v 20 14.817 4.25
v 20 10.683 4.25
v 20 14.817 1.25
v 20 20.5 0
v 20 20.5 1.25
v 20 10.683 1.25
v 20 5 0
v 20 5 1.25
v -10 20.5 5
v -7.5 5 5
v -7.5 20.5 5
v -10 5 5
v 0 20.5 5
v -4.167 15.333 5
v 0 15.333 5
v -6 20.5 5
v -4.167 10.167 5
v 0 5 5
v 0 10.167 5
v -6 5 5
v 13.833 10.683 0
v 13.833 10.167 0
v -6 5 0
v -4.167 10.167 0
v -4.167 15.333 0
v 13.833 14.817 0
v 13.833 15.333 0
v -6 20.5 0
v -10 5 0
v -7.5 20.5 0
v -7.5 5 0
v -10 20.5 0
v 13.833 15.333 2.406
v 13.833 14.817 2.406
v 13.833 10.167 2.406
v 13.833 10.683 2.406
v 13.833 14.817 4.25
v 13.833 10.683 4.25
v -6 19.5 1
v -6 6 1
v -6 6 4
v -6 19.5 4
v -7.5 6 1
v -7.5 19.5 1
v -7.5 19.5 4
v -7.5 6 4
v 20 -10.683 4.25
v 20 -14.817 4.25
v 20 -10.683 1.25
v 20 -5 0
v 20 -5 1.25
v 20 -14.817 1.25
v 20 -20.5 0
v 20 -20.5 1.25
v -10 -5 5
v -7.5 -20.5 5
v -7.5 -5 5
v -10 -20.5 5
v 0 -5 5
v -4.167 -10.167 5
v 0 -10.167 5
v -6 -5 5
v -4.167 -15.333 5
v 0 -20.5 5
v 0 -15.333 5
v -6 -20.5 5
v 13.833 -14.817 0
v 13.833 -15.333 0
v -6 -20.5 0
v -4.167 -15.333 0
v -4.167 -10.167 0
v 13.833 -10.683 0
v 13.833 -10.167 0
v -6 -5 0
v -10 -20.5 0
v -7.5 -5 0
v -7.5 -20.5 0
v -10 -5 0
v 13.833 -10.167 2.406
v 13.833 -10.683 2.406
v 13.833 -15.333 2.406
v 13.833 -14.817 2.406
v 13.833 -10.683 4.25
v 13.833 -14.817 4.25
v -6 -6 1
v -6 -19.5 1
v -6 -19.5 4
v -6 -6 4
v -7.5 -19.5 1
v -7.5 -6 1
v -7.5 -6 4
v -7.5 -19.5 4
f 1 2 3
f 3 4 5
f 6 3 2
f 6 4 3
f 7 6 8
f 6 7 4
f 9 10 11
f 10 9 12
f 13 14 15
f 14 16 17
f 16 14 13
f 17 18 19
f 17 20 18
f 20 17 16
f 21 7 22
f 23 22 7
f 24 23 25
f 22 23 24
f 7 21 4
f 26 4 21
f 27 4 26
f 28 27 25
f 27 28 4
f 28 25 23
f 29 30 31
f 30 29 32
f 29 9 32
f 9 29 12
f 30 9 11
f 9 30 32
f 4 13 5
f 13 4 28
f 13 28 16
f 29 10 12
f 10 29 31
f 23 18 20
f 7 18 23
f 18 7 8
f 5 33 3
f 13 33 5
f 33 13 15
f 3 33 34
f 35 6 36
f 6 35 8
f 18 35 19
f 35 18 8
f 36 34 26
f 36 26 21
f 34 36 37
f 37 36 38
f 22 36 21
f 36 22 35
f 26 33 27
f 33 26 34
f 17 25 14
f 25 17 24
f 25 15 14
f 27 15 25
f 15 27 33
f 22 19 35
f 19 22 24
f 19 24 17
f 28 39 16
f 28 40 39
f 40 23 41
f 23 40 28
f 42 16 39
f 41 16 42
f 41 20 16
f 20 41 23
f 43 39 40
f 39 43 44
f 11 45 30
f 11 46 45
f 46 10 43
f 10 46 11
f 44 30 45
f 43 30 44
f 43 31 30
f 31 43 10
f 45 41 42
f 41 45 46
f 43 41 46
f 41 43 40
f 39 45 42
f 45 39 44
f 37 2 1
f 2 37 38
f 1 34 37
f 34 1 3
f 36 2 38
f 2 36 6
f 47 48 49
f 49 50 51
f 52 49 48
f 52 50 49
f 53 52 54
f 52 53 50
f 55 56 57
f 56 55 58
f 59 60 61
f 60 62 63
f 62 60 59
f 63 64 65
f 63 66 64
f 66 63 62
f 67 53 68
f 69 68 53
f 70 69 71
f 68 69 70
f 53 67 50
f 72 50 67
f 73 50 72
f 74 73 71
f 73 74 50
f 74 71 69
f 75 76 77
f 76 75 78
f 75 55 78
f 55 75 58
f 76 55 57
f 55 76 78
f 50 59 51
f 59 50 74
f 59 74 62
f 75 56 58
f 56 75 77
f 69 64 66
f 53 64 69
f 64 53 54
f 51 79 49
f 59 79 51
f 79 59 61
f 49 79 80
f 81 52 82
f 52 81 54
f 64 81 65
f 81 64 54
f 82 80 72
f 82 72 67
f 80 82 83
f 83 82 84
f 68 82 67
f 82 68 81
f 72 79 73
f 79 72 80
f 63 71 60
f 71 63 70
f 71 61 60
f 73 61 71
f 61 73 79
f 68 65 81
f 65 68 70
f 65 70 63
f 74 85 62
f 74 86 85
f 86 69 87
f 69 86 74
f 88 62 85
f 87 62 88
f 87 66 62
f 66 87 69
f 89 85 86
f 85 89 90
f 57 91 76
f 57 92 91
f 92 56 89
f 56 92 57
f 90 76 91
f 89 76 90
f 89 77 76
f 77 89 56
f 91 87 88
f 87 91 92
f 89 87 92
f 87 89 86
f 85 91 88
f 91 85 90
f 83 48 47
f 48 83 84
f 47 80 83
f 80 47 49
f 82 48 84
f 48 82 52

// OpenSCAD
/*
 *  Casement Window Sash Stopper
 *  Copyright (c) 2019 David M. Syzdek <david@syzdek.net>
 *
 *  Redistribution and use in source and binary forms, with or without
 *  modification, are permitted provided that the following conditions are
 *  met:
 *
 *     * Redistributions of source code must retain the above copyright
 *       notice, this list of conditions and the following disclaimer.
 *     * Redistributions in binary form must reproduce the above copyright
 *       notice, this list of conditions and the following disclaimer in the
 *       documentation and/or other materials provided with the distribution.
 *     * Neither the name of David M. Syzdek nor the
 *       names of its contributors may be used to endorse or promote products
 *       derived from this software without specific prior written permission.
 *
 *  THIS SOFTWARE IS PROVIDED BY THE COPYRIGHT HOLDERS AND CONTRIBUTORS "AS
 *  IS" AND ANY EXPRESS OR IMPLIED WARRANTIES, INCLUDING, BUT NOT LIMITED TO,
 *  THE IMPLIED WARRANTIES OF MERCHANTABILITY AND FITNESS FOR A PARTICULAR
 *  PURPOSE ARE DISCLAIMED. IN NO EVENT SHALL DAVID M. SYZDEK BE LIABLE FOR
 *  ANY DIRECT, INDIRECT, INCIDENTAL, SPECIAL, EXEMPLARY, OR CONSEQUENTIAL
 *  DAMAGES (INCLUDING, BUT NOT LIMITED TO, PROCUREMENT OF SUBSTITUTE GOODS OR
 *  SERVICES; LOSS OF USE, DATA, OR PROFITS; OR BUSINESS INTERRUPTION) HOWEVER
 *  CAUSED AND ON ANY THEORY OF LIABILITY, WHETHER IN CONTRACT, STRICT
 *  LIABILITY, OR TORT (INCLUDING NEGLIGENCE OR OTHERWISE) ARISING IN ANY WAY
 *  OUT OF THE USE OF THIS SOFTWARE, EVEN IF ADVISED OF THE POSSIBILITY OF
 *  SUCH DAMAGE.
 *
 *  This is a non-permanent, adjustable stopper for a casement window. The
 *  stopper works by placing two opposing, interlocked wedges within the
 *  track of the sash runner.  As the runner pushes against the wedges, the
 *  wedges lock into place using friction generated by the pressure on the
 *  wedges to prevent the sash from moving forward.
 *
 *  To adjust the placement of the wedges:
 *     1. Loosen the wedges by using the fingernail notches to pull the wedges
 *        apart.
 *     2. Adjust the location of the wedges by pulling the leading wedge using
 *        the fingernail notches in the direction of intended adjustment.
 *     3. Once the wedges are adjusted to the desired location, squeeze the two
 *        wedges together to lock into place.
 */


w = 15.5;  // width
h =  5.0;  // height


l = h*4;              // length
a = atan((h*0.75)/l); // angle of slope

module window_stopper()
{
   union()
   {
      difference()
      {
         // creates base
         translate([ -(h*2), 0, 0 ])
            cube([  l+(h*2), w, h ], center = false);

         // cuts slope
         translate( [ 0,    -1,   h ] ) 
            rotate( [ 0,     a,   0 ] ) 
            cube(   [ l*2, w+2, h*2 ], center=false);
      
         // cuts slot for stopper
         translate([ 1-(w/3),               ((w/3)), -1] )
            cube(  [     l-2, ((w/3)), 10], center=false);

         // cuts bottom fingernail tab
         translate([ 2.5-(h*2),  -1,  -1 ] )
             cube([        1.5, w+2,   2 ], center=false);
          
         // cuts top fingernail tab
         translate([ 2.5-(h*2),  -1, h-1 ] )
             cube([        1.5, w+2,   2 ], center=false);

         // cuts left fingernail tab
         translate([ 2.5-(h*2),  -1,  -1 ] )
             cube([        1.5,   2, h+2 ], center=false);

         // cuts right fingernail tab
         translate([ 2.5-(h*2), w-1,  -1 ] )
             cube([        1.5,   2, h+2 ], center=false);
      };

      // adds stopper
      translate( [ l-(w/3)-1, (w/3)*1.10,    0] )
         cube(   [   (w/3)+1, (w/3)*0.80, h*.85], center=false);
   };
};


// bottom stopper
translate([0,    5, 0]) window_stopper();
translate([0, -w-5, 0]) window_stopper();


/* end of script */
